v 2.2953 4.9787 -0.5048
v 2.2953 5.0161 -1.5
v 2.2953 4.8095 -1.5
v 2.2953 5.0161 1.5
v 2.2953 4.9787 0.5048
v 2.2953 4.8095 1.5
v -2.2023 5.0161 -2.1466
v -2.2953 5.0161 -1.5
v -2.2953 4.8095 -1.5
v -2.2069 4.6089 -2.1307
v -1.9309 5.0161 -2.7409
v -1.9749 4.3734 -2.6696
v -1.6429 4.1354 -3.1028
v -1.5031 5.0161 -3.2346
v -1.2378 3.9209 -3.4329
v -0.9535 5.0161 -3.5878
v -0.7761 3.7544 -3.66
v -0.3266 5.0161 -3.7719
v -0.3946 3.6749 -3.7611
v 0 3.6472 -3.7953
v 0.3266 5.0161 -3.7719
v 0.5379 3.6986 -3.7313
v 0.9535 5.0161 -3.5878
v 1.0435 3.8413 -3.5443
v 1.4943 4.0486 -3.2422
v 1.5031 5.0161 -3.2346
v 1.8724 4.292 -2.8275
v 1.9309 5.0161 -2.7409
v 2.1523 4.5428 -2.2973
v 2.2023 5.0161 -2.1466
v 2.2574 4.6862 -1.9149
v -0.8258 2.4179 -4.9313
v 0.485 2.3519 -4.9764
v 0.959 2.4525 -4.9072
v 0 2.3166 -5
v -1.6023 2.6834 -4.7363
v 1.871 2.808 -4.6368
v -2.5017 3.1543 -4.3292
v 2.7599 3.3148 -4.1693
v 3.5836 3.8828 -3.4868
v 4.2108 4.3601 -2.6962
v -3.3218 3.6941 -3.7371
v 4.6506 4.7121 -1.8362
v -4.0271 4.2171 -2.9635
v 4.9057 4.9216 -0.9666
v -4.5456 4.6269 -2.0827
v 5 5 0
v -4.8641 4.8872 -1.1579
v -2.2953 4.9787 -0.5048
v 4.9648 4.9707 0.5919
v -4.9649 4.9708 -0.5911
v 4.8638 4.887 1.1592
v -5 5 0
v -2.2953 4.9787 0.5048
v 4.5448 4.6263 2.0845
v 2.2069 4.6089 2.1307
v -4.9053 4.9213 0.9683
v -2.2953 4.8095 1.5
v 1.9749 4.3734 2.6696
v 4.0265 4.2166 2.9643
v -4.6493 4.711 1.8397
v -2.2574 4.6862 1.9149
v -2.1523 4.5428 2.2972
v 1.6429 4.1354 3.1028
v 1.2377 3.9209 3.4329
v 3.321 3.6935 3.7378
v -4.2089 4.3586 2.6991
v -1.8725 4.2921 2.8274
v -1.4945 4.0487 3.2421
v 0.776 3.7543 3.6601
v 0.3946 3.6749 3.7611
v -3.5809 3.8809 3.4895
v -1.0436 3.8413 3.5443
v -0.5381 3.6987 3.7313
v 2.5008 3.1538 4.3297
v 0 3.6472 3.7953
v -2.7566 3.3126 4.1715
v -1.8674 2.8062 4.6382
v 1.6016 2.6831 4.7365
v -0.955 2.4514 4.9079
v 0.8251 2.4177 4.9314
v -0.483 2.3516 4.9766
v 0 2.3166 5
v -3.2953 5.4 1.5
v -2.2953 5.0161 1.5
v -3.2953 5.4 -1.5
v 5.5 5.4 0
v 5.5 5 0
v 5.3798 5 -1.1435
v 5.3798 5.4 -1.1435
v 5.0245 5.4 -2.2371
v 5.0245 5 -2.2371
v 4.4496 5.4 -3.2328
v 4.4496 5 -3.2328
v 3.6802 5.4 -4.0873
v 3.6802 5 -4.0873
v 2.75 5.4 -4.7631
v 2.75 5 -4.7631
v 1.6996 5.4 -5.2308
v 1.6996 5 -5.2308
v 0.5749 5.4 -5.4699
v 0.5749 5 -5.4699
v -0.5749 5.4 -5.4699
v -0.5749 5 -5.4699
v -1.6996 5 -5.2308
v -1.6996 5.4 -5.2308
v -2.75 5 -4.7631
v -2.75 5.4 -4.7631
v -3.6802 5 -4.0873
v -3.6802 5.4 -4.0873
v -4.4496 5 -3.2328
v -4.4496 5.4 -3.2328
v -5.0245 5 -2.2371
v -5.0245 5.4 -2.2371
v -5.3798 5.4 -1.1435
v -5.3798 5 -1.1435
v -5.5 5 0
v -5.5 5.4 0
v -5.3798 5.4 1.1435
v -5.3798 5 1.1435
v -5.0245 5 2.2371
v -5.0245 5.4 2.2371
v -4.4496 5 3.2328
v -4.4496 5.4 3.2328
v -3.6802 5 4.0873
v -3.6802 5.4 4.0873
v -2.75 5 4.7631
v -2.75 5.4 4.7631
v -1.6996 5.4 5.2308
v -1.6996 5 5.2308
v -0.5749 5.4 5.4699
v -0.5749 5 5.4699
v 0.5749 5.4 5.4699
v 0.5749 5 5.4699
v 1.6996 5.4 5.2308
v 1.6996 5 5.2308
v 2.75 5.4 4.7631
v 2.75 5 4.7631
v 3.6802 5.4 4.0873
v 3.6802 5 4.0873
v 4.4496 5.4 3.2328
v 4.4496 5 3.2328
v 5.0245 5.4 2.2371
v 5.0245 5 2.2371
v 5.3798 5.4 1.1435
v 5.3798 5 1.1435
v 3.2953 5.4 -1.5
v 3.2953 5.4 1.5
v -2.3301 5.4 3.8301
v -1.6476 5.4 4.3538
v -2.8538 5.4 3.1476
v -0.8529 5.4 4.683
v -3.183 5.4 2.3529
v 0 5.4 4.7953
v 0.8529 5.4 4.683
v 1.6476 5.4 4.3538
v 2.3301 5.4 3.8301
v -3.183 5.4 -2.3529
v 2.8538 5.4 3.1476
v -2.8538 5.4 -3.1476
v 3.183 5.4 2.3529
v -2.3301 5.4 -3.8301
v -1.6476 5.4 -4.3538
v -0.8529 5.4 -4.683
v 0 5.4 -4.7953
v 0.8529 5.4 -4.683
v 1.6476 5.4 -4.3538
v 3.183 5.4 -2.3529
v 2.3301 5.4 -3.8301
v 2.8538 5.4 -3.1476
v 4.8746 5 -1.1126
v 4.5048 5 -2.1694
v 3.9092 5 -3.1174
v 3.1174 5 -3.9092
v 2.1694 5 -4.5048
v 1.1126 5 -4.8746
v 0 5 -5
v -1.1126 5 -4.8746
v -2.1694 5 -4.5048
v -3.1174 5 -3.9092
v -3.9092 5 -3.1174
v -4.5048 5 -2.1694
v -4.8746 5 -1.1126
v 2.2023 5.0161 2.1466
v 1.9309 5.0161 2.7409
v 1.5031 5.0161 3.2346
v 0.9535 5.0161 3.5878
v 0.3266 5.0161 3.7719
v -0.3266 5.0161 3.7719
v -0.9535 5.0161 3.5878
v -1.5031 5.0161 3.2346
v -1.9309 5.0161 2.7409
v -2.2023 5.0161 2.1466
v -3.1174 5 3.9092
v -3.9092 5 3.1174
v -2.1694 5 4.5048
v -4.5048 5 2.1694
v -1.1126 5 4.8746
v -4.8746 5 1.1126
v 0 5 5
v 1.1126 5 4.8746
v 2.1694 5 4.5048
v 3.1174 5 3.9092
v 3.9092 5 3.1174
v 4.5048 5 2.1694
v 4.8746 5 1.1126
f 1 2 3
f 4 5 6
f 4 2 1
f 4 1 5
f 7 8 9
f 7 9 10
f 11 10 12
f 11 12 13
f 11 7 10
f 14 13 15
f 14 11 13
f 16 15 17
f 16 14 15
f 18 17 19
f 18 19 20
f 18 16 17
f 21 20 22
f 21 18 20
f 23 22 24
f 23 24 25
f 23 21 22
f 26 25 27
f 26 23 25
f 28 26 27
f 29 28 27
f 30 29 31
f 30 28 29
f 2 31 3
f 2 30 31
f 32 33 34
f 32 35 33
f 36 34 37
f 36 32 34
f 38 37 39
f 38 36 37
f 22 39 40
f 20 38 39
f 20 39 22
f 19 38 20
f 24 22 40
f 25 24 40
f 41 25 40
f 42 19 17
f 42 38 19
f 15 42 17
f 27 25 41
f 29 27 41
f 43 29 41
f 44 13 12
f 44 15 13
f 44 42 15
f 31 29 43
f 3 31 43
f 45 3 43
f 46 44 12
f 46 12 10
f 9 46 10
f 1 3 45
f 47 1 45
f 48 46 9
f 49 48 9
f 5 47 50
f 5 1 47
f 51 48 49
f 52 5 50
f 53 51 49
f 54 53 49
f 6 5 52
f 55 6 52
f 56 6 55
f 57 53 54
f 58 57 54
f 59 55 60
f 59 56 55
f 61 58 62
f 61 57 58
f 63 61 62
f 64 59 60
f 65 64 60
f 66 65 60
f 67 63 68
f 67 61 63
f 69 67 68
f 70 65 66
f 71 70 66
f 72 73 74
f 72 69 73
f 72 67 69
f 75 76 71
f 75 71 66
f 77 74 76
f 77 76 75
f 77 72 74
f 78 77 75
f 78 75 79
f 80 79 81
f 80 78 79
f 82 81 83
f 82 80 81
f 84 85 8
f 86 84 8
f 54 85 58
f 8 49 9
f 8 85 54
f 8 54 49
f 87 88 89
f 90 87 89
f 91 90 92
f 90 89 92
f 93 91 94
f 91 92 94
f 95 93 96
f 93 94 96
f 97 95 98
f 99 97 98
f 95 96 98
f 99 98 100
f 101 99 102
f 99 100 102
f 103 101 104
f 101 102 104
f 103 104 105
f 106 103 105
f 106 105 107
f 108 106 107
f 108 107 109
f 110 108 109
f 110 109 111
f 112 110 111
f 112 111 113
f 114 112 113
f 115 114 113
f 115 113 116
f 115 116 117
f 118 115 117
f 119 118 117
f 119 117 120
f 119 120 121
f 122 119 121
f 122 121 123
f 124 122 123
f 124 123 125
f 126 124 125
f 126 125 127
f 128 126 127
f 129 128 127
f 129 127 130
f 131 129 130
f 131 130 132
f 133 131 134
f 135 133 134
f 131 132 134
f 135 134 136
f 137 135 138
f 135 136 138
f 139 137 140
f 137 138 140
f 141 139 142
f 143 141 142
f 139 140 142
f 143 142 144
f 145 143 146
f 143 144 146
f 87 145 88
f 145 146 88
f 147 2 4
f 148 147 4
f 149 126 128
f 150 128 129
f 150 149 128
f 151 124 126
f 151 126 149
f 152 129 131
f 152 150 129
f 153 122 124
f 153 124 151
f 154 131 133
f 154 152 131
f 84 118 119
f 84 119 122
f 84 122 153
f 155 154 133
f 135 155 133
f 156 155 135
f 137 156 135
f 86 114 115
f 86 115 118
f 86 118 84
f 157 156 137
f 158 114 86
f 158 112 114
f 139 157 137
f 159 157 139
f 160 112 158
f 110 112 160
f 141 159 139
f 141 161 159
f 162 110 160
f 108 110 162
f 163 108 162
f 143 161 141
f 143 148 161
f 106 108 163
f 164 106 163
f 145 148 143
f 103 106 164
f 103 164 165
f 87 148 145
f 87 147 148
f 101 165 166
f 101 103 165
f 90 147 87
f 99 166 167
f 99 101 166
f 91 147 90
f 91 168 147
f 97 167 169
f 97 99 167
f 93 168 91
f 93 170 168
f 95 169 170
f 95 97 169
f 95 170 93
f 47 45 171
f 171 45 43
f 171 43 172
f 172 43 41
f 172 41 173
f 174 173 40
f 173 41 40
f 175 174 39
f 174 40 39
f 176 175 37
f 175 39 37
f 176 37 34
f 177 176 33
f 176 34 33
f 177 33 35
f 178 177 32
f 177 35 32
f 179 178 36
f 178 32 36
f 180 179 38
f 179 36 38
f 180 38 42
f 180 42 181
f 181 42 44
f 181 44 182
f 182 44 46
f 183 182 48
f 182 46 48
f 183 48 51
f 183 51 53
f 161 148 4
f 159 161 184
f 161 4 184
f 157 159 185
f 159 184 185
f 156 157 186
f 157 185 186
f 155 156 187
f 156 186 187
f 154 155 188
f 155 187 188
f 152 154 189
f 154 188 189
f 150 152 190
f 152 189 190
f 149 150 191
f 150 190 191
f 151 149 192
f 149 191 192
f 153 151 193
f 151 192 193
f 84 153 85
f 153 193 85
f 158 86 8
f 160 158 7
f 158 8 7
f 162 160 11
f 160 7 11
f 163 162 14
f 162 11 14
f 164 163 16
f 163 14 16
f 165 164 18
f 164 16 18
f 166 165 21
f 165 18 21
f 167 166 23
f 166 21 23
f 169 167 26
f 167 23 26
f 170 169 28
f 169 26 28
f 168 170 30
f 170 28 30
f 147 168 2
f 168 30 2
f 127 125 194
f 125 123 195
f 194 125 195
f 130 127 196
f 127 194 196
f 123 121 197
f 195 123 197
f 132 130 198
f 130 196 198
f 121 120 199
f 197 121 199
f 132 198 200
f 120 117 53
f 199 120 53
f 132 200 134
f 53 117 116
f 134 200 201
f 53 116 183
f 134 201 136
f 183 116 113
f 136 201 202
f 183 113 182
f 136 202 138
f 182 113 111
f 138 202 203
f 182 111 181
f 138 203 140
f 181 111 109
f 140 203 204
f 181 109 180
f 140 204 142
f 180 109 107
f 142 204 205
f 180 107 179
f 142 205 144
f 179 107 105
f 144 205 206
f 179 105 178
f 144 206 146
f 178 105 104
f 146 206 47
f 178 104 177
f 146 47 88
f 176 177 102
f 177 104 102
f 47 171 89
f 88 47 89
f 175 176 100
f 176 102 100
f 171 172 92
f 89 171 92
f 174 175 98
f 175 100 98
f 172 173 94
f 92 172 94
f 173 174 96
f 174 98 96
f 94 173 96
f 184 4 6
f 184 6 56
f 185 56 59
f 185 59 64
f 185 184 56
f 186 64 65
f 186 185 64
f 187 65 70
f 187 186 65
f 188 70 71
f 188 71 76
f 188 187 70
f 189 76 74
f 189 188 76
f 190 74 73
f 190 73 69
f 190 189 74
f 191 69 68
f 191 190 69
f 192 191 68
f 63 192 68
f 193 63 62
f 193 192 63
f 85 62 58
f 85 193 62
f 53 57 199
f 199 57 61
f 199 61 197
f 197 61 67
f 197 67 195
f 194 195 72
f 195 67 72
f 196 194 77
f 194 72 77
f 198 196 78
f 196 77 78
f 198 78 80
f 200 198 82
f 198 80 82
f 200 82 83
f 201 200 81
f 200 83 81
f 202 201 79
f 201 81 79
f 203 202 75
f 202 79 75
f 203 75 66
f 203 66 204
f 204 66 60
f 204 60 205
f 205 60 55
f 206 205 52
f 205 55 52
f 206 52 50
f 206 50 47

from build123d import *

# Parameters (mm, degrees)
SKETCH1_R               = 5
BOSS_EXTRUDE1_DEPTH     = 5
SKETCH2_R               = 5.5
BOSS_EXTRUDE2_DEPTH     = 0.4
CUT_EXTRUDE1_DEPTH      = 6.4
SKETCH5_R               = 6
CUT_EXTRUDE2_DEPTH      = 6.5
CUT_EXTRUDE2_DEPTH_BACK = 6.5
CHAMFER4_SIZE           = 1
CHAMFER4_SIZE2          = 0.383864035


with BuildPart() as part:
    # Sketch1 → Boss-Extrude1 (new body)
    with BuildSketch(Plane(origin=(0, 0, 0), x_dir=(1, 0, 0), z_dir=(0, 1, 0))):
        Circle(SKETCH1_R)
    extrude(amount=BOSS_EXTRUDE1_DEPTH)

    # Sketch2 → Boss-Extrude2 (add)
    with BuildSketch(Plane(origin=(0, 5, 0), x_dir=(1, 0, 0), z_dir=(0, 1, 0))):
        Circle(SKETCH2_R)
    extrude(amount=BOSS_EXTRUDE2_DEPTH)

    # Sketch4 → Cut-Extrude1 (cut, through all)
    with BuildSketch(Plane(origin=(0, 5.4, 0), x_dir=(1, 0, 0), z_dir=(0, 1, 0))):
        with BuildLine():
            Line((2.295250379, 1.5), (2.295250379, -1.5))
            ThreePointArc((2.295250379, -1.5), (0, -3.795250379), (-2.295250379, -1.5))
            Line((-2.295250379, -1.5), (-2.295250379, 1.5))
            ThreePointArc((-2.295250379, 1.5), (0, 3.795250379), (2.295250379, 1.5))
        make_face()
    extrude(amount=-CUT_EXTRUDE1_DEPTH, mode=Mode.SUBTRACT)

    # Sketch5 → Cut-Extrude2 (cut, two sides)
    with BuildSketch(Plane(origin=(0, 0, 0), x_dir=(0, 0, -1), z_dir=(1, 0, 0))) as cut_extrude2_sk:
        with Locations((0, -1)):
            Circle(SKETCH5_R)
    extrude(amount=CUT_EXTRUDE2_DEPTH, mode=Mode.SUBTRACT)
    extrude(cut_extrude2_sk.sketch, amount=-CUT_EXTRUDE2_DEPTH_BACK, mode=Mode.SUBTRACT)

    # Chamfer4
    chamfer4_edges = [part.edges().sort_by_distance(p)[0] for p in [
        (0, 5.4, -3.795250379),
        (-2.295250379, 5.4, 0),
        (0, 5.4, 3.795250379),
        (2.295250379, 5.4, 0),
    ]]
    chamfer4_side = [part.faces().sort_by_distance(p)[0] for p in [
        (-5.344436508, 5.4, 0),
    ]]
    chamfer(chamfer4_edges, length=CHAMFER4_SIZE, length2=CHAMFER4_SIZE2, reference=chamfer4_side[0])


solid = part.part
